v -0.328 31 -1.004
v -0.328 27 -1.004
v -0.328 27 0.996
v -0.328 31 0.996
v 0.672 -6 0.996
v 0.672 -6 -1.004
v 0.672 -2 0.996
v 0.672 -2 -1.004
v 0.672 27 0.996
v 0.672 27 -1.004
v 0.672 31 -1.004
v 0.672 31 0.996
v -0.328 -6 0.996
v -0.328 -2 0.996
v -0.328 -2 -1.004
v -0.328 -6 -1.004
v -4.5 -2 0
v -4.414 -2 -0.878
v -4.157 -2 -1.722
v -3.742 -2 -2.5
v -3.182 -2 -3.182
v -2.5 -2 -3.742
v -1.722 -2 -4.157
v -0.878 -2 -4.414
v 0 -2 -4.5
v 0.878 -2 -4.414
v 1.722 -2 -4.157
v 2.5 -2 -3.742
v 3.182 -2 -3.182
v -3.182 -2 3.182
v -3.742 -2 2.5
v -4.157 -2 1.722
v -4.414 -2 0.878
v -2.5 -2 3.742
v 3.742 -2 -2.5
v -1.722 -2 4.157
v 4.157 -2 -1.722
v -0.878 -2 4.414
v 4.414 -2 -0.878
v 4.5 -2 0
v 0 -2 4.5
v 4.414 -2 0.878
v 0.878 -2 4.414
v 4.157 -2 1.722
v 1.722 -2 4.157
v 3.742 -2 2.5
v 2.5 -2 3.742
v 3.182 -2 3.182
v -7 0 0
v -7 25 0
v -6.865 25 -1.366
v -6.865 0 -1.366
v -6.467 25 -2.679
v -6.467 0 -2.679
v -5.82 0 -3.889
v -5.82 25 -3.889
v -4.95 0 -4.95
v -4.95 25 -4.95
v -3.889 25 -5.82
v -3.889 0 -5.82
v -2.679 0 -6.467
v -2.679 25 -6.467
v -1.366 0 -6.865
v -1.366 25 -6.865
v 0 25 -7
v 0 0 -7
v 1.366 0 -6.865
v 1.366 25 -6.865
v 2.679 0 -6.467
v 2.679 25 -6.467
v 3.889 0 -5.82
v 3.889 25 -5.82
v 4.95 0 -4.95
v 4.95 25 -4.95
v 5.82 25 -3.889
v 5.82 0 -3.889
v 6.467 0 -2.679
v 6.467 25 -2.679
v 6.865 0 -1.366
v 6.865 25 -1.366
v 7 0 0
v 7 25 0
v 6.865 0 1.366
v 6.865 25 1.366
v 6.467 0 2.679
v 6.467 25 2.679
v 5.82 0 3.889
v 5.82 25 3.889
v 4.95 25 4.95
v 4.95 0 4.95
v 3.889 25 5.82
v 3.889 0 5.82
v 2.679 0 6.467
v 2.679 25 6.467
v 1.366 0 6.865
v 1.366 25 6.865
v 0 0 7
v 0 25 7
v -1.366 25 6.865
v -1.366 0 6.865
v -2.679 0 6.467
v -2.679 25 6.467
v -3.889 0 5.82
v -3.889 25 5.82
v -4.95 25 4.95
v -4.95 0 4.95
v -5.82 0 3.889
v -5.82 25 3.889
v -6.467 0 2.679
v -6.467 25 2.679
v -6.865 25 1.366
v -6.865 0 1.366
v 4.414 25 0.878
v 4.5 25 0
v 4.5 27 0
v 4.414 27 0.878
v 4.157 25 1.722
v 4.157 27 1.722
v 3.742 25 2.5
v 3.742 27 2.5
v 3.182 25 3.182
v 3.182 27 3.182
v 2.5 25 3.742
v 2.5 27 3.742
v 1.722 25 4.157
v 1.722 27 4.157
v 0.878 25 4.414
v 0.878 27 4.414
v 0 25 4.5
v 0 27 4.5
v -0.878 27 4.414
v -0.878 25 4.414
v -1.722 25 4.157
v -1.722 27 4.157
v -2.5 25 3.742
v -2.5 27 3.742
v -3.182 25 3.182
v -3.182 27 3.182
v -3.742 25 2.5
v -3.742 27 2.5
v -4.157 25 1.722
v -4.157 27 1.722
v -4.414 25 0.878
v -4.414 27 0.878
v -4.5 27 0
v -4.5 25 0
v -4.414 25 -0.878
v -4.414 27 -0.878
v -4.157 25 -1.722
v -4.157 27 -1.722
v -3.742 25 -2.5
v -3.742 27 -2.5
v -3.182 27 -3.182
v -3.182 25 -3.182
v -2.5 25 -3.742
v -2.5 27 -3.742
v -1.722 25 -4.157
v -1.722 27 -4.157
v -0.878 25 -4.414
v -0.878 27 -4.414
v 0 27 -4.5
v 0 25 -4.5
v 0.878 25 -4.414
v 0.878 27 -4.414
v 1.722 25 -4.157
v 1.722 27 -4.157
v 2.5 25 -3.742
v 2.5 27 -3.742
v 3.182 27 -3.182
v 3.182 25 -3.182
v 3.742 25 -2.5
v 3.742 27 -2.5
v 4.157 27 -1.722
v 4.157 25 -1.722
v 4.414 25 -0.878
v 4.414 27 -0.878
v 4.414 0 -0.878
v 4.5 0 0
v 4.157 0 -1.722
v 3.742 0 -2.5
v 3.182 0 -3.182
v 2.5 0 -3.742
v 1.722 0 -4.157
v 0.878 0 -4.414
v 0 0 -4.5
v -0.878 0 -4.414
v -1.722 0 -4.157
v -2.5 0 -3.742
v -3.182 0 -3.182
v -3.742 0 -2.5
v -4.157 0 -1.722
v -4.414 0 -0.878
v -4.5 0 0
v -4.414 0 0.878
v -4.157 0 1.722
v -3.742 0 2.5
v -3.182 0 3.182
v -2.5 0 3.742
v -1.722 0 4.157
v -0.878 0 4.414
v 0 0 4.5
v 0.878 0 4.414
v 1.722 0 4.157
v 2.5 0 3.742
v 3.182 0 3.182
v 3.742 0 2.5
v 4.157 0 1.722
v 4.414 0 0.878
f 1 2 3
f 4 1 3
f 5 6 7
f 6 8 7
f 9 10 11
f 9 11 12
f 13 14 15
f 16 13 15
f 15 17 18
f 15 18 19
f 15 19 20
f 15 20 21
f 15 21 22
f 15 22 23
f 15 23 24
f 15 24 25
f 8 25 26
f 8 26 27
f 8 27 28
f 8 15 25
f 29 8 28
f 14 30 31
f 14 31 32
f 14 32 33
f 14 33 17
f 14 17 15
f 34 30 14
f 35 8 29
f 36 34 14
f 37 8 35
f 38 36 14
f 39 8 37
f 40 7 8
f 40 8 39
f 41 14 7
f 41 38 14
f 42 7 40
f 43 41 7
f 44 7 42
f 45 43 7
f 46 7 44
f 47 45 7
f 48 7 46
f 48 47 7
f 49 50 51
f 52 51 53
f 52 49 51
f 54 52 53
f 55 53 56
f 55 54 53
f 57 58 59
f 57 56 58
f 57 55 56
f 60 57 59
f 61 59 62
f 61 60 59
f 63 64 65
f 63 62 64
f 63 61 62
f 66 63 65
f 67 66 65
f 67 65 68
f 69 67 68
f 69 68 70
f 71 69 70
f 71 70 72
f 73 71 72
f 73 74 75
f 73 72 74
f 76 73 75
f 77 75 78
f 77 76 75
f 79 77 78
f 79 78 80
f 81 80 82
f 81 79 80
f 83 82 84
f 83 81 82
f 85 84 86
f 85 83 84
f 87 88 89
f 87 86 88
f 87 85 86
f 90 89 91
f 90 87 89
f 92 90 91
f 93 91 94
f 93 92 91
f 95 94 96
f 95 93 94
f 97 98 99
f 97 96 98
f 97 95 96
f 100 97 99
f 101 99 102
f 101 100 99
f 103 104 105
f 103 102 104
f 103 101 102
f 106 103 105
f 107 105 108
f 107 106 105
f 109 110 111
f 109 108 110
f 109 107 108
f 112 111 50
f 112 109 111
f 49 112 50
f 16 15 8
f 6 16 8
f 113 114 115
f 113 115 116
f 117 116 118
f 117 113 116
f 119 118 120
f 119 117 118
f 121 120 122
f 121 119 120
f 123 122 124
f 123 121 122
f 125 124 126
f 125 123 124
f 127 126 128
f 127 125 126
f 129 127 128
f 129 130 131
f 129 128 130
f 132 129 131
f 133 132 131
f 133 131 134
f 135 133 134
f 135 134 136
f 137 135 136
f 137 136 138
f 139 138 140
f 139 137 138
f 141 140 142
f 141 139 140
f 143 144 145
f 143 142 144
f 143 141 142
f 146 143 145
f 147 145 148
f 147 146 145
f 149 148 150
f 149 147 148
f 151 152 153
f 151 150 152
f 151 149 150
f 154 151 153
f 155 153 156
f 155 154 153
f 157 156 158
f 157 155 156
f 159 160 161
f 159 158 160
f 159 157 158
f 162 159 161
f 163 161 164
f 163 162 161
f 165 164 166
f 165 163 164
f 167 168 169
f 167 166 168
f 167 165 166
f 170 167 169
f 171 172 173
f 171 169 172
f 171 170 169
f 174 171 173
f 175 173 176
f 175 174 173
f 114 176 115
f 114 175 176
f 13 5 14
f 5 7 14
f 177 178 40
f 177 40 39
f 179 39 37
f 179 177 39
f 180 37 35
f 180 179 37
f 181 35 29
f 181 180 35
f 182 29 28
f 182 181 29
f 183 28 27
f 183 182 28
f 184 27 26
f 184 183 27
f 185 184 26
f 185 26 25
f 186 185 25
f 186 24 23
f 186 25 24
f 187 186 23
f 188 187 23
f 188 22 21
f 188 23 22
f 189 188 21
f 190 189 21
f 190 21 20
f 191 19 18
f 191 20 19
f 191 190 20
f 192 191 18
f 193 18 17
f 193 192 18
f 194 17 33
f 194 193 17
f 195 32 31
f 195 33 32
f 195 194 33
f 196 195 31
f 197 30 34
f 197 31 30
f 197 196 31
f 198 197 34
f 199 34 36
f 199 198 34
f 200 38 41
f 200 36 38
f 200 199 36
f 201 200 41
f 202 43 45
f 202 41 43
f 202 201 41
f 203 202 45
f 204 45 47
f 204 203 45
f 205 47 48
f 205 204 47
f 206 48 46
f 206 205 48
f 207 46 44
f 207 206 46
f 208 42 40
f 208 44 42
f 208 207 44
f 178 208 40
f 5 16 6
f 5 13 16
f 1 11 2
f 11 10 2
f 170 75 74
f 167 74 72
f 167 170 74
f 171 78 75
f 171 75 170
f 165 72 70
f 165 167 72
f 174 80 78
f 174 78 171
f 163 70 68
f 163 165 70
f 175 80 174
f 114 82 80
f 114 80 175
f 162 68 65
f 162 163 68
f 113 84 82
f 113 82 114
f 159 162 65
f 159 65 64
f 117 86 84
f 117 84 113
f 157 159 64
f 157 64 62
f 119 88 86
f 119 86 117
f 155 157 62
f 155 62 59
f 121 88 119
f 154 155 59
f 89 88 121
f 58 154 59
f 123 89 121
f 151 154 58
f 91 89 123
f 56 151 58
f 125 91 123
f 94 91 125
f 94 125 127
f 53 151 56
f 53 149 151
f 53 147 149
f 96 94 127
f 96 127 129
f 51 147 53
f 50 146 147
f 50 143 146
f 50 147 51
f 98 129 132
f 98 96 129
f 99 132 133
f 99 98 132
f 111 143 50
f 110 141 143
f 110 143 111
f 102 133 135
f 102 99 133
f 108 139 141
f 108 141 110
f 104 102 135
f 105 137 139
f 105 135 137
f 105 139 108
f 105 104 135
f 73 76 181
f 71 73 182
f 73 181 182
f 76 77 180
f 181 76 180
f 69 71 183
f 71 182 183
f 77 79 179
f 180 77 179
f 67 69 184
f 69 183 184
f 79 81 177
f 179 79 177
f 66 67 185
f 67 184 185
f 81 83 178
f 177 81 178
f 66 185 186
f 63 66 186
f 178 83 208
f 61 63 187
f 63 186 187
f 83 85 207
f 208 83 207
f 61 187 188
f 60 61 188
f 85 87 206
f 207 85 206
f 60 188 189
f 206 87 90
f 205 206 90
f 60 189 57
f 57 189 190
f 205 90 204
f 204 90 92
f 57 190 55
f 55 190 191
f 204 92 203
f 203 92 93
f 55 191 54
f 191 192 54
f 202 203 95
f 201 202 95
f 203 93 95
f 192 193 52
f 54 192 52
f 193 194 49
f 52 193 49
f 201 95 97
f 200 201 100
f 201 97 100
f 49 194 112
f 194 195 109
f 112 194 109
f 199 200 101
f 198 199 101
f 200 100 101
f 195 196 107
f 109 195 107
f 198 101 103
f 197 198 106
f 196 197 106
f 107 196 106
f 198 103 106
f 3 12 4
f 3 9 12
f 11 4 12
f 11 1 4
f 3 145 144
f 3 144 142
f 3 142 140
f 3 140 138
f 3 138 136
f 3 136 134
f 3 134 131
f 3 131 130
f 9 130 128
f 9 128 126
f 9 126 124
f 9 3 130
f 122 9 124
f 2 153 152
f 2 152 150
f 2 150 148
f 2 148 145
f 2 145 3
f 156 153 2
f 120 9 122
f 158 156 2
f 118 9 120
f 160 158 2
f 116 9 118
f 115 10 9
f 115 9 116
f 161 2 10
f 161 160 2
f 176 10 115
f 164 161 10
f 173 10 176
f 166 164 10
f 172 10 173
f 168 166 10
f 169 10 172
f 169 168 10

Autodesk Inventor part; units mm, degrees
ref_plane "YZ Plane" through (0, 0, 0) normal (1, 0, 0) x (0, 1, 0)
ref_plane "XZ Plane" through (0, 0, 0) normal (0, 1, 0) x (-1, 0, 0)
ref_plane "XY Plane" through (0, 0, 0) normal (0, 0, 1) x (1, 0, 0)
sketch "Sketch1" plane through (0, 0, 0) normal (0, 1, 0) x (-1, 0, 0)
  circle A0 centre (0, 0) radius 7
  dimension "d0" = 14
extrude "Extrusion1" add sketch "Sketch1" along normal blind 25
sketch "Sketch2" plane through (0, 25, 0) normal (0, 1, 0) x (1, 0, 0)
  circle A0 centre (0, 0) radius 4.5
  dimension "d3" = 9
sketch "Sketch3" plane through (0, 0, 0) normal (0, -1, 0) x (1, 0, 0)
  circle A0 centre (0, 0) radius 4.5
  dimension "d4" = 9
extrude "Extrusion2" add sketch "Sketch3" along normal mid plane 4
extrude "Extrusion3" add sketch "Sketch2" along normal blind 2
sketch "Sketch4" plane through (0, -2, 0) normal (0, -1, 0) x (1, 0, 0)
  line L0 (-0.3275, -1.0042) -> (0.6725, -1.0042)
  line L1 (0.6725, -1.0042) -> (0.6725, 0.9958)
  line L2 (0.6725, 0.9958) -> (-0.3275, 0.9958)
  line L3 (-0.3275, 0.9958) -> (-0.3275, -1.0042)
  point P0 (0, 0)
  dimension "d9" = 1
  dimension "d10" = 2
extrude "Extrusion4" add sketch "Sketch4" along normal blind 4
sketch "Sketch5" plane through (0, 27, 0) normal (0, 1, 0) x (1, 0, 0)
  line L0 (0.6725, -0.9958) -> (-0.3275, -0.9958) projected
  line L1 (0.6725, 1.0042) -> (0.6725, -0.9958) projected
  line L2 (-0.3275, -0.9958) -> (0.6725, -0.9958)
  line L3 (0.6725, -0.9958) -> (0.6725, 1.0042)
  line L4 (0.6725, 1.0042) -> (-0.3275, 1.0042)
  line L5 (-0.3275, 1.0042) -> (-0.3275, -0.9958)
  point P0 (0, 0)
extrude "Extrusion5" add sketch "Sketch5" along normal blind 4
properties part number "tilt"
